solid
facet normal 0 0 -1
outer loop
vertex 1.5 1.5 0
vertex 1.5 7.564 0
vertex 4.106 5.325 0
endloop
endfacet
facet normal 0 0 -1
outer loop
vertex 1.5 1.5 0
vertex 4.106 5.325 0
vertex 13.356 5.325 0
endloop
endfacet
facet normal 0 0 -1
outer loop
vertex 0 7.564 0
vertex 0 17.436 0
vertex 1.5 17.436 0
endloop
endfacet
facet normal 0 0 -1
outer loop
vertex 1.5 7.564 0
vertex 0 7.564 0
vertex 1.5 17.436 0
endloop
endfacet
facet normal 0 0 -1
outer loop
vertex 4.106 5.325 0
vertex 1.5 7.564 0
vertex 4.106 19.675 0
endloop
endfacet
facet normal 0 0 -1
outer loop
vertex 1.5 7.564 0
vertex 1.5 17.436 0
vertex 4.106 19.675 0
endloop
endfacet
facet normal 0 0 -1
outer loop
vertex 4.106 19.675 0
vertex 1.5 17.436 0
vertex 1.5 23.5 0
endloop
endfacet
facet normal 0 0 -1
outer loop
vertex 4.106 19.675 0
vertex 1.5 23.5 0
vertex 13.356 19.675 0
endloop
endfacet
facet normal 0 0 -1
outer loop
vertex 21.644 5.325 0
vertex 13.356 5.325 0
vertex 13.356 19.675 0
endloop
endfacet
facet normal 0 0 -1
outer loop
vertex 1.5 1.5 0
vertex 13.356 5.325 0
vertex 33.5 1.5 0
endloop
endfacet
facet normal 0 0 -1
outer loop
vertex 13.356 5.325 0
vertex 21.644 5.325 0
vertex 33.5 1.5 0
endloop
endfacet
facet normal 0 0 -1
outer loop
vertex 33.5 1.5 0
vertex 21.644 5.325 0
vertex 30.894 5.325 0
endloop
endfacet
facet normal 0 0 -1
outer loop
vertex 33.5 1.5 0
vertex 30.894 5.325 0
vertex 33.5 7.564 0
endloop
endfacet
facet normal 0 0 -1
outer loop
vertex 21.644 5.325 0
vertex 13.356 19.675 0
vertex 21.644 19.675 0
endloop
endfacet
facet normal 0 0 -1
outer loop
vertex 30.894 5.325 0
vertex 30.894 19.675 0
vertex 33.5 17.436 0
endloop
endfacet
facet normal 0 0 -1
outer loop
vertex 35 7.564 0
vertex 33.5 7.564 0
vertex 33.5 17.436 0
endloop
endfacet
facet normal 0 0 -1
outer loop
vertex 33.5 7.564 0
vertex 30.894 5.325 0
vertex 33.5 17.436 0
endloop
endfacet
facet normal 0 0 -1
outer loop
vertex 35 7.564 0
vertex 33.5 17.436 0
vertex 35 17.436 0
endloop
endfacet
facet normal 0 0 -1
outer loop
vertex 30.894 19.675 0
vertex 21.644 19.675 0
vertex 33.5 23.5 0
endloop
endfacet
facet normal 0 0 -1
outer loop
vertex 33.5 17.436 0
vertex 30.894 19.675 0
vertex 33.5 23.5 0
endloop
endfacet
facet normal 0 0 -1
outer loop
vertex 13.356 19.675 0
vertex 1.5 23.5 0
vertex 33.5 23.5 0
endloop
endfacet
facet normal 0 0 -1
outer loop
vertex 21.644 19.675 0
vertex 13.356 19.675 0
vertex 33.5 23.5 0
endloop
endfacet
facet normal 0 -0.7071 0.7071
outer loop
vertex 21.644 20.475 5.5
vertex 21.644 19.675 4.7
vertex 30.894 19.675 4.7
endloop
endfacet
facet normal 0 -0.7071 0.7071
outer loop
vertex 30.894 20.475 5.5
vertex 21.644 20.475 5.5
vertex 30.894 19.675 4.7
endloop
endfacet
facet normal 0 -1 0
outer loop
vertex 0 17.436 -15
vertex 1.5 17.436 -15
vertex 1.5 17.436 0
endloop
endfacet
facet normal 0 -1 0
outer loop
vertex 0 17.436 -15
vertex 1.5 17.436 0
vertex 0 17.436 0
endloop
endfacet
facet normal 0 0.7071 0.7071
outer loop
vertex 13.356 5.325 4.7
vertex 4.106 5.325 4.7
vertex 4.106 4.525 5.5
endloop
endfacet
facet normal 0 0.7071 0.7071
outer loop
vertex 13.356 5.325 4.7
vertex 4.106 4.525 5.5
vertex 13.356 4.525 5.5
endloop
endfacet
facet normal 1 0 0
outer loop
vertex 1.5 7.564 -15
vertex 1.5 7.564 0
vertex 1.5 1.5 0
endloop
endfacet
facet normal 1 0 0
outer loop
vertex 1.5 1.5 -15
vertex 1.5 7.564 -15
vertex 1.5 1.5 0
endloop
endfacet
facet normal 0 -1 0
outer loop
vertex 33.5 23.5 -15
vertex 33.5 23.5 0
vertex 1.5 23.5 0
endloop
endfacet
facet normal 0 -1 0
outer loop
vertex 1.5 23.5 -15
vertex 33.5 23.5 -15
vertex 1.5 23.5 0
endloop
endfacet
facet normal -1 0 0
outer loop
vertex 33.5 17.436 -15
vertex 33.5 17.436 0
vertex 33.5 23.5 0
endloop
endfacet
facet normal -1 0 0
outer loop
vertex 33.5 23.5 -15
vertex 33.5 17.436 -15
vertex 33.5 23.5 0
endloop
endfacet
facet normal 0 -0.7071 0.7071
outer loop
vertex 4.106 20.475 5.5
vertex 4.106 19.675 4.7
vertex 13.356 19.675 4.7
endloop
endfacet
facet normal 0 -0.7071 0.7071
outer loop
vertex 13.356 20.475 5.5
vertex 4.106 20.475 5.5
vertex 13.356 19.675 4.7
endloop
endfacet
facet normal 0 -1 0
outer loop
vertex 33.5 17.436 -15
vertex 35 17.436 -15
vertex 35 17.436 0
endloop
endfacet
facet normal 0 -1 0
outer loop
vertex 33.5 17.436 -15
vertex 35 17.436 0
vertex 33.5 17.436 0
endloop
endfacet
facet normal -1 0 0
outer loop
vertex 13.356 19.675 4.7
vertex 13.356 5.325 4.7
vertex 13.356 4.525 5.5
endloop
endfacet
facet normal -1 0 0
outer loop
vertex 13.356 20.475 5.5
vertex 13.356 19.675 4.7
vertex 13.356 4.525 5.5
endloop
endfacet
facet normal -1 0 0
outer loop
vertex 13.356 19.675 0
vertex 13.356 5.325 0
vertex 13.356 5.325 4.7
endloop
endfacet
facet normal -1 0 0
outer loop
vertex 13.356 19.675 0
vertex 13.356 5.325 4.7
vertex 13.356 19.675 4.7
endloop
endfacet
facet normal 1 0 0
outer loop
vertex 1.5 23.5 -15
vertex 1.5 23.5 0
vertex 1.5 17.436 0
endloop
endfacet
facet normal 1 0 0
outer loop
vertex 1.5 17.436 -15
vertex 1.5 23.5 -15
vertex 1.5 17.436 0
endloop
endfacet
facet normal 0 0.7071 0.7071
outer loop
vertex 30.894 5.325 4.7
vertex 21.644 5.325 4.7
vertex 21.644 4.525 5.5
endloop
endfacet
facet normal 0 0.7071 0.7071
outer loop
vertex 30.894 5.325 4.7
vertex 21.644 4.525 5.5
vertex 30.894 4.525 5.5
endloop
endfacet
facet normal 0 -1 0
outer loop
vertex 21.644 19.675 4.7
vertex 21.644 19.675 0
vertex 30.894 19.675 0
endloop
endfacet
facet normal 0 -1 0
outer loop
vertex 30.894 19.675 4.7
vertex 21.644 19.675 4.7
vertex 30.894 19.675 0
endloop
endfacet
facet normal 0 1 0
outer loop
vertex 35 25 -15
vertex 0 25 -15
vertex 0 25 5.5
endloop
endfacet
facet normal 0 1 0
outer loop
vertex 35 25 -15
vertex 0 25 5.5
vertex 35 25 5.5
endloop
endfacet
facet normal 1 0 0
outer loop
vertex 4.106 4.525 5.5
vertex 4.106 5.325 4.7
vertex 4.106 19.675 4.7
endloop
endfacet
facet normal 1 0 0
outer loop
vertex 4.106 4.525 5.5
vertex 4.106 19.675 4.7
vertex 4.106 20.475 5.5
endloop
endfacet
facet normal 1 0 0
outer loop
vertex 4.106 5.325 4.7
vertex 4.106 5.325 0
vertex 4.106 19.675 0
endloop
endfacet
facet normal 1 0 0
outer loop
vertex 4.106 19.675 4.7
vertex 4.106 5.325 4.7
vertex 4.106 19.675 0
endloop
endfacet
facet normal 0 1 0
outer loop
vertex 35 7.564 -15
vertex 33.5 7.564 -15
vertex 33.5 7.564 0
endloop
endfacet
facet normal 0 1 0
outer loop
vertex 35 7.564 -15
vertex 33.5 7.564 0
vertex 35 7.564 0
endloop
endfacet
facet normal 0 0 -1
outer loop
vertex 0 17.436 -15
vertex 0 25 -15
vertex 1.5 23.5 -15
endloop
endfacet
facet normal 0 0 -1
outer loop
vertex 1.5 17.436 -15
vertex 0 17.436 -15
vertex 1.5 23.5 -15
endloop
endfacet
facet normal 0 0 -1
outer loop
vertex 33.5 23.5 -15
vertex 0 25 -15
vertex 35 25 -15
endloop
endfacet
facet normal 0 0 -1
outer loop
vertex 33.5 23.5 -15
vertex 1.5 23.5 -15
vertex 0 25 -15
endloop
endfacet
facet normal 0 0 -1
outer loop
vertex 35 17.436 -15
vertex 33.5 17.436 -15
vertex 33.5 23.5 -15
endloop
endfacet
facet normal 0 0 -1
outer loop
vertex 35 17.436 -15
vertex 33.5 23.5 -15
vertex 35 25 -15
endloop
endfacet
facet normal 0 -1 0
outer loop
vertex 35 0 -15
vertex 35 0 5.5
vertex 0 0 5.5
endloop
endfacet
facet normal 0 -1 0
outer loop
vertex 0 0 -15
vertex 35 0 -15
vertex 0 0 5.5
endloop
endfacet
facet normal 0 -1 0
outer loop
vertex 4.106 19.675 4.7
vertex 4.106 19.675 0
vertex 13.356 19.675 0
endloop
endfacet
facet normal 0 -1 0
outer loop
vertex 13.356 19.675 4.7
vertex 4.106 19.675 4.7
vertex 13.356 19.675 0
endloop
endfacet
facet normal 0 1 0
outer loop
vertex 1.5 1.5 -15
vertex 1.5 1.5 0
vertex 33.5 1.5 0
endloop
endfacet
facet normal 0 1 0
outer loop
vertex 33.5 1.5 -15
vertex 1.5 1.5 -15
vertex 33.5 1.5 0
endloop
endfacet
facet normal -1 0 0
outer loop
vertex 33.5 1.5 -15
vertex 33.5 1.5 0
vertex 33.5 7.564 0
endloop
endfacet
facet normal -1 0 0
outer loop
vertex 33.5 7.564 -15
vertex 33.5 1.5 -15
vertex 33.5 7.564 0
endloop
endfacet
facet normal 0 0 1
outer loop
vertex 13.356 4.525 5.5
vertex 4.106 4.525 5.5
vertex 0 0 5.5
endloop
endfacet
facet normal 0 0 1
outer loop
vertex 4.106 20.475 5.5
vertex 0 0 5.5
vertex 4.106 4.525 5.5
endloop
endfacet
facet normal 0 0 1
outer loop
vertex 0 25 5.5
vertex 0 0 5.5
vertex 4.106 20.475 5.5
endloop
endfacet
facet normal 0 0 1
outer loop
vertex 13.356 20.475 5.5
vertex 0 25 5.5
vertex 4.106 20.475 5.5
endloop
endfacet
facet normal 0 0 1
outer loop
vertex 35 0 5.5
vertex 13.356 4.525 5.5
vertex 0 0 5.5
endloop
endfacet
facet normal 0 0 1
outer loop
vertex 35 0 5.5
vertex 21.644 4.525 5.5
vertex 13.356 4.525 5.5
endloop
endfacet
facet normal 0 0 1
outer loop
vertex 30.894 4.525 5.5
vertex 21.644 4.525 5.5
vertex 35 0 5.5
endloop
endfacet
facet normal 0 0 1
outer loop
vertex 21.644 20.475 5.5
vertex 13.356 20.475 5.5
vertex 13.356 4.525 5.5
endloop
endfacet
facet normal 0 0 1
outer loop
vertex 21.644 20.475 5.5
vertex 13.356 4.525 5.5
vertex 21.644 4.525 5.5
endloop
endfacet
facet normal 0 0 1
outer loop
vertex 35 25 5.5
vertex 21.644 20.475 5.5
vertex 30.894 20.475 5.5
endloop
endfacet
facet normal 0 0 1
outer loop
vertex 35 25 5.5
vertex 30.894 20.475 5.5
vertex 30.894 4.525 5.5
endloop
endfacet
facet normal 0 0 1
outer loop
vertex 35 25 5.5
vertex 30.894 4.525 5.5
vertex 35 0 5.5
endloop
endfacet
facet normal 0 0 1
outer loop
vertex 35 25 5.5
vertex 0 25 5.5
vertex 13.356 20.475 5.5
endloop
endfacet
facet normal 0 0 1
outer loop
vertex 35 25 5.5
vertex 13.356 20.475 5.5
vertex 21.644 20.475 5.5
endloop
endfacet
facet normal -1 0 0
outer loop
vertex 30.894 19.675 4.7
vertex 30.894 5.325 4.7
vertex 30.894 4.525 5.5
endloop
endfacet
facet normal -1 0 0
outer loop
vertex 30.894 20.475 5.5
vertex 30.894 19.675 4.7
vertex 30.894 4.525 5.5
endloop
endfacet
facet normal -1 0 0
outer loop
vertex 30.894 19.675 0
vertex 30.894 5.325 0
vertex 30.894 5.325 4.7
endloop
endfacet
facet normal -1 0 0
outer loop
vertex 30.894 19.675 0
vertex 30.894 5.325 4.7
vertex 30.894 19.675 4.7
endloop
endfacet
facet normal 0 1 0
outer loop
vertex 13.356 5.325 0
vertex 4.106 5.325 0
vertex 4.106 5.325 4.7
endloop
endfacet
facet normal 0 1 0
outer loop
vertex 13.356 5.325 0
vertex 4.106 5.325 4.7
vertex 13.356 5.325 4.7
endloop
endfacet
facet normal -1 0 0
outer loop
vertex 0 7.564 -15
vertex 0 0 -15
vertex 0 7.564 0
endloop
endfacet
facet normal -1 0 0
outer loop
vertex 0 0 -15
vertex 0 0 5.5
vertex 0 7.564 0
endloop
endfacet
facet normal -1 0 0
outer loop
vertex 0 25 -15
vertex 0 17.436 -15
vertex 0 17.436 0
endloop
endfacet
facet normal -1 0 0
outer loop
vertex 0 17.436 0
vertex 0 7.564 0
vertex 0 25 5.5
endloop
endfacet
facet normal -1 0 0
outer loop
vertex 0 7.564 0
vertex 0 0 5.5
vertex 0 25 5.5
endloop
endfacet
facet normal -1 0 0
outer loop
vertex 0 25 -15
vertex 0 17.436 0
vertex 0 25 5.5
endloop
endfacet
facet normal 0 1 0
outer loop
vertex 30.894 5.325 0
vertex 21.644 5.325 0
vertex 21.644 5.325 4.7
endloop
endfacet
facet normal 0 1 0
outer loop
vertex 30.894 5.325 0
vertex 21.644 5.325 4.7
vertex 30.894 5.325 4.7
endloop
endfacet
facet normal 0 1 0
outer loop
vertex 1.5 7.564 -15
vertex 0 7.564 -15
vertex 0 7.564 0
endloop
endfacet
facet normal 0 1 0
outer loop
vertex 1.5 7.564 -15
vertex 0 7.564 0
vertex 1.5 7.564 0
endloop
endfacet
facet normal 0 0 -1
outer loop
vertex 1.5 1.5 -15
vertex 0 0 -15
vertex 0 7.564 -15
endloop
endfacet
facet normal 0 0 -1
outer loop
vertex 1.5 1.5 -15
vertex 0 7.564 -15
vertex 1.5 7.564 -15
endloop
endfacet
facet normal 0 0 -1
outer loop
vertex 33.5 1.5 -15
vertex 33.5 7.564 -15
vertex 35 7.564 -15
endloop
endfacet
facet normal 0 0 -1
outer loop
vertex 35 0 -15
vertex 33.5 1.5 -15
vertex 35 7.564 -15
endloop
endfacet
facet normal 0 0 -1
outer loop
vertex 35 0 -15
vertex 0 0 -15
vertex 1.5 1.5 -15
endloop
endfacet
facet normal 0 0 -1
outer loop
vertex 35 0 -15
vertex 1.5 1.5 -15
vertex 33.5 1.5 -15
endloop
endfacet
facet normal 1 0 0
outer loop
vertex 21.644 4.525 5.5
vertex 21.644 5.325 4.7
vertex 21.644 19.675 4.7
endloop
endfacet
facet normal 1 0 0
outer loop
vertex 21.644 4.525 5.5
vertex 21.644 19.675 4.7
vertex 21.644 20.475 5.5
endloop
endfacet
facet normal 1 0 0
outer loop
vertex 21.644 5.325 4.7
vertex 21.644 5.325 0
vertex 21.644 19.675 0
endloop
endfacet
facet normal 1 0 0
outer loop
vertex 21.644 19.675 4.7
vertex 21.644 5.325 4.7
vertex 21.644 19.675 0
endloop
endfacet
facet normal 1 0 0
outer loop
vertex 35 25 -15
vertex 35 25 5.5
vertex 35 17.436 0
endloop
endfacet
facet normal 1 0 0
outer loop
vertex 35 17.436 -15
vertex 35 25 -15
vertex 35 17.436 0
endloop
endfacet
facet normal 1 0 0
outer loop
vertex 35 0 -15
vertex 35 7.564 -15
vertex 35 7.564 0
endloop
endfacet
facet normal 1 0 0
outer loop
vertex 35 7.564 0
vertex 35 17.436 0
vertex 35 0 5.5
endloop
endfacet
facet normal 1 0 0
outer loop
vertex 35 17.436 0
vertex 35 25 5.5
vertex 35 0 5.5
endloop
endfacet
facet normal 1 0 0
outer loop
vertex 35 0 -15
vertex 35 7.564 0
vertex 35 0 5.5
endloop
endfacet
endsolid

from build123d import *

# Parameters (mm, degrees)
F0_W     = 35
F0_H     = 25
F0_W_2   = 9.25
F0_H_2   = 14.35
F1_DEPTH = 5.5
F3_DEPTH = 15
F4_SIZE  = 0.8


with BuildPart() as f1:
    # F0 (on Top) → F1 (new body)
    with BuildSketch(Plane.XY):
        with Locations((17.5, 12.5)):
            Rectangle(F0_W, F0_H)
        with Locations((8.731327, 12.5)):
            Rectangle(F0_W_2, F0_H_2, mode=Mode.SUBTRACT)
        with Locations((26.268673, 12.5)):
            Rectangle(F0_W_2, F0_H_2, mode=Mode.SUBTRACT)
    extrude(amount=F1_DEPTH)

    # F2 (on face) → F3 (join)
    with BuildSketch(Plane(origin=(0, 0, 0), x_dir=(1, 0, 0), z_dir=(0, 0, -1))):
        Polygon((35, 0), (0, 0), (0, -7.563511), (1.5, -7.563511), (1.5, -1.5), (33.5, -1.5), (33.5, -7.563511), (35, -7.563511), align=None)
        Polygon((1.5, -17.436489), (0, -17.436489), (0, -25), (35, -25), (35, -17.436489), (33.5, -17.436489), (33.5, -23.5), (1.5, -23.5), align=None)
    extrude(amount=F3_DEPTH)

    # F4
    f4_edges = [f1.edges().sort_by_distance(p)[0] for p in [
        (8.731327, 19.675, 5.5),
        (8.731327, 5.325, 5.5),
        (26.268673, 19.675, 5.5),
        (26.268673, 5.325, 5.5),
    ]]
    chamfer(f4_edges, length=F4_SIZE)


solid = f1.part
